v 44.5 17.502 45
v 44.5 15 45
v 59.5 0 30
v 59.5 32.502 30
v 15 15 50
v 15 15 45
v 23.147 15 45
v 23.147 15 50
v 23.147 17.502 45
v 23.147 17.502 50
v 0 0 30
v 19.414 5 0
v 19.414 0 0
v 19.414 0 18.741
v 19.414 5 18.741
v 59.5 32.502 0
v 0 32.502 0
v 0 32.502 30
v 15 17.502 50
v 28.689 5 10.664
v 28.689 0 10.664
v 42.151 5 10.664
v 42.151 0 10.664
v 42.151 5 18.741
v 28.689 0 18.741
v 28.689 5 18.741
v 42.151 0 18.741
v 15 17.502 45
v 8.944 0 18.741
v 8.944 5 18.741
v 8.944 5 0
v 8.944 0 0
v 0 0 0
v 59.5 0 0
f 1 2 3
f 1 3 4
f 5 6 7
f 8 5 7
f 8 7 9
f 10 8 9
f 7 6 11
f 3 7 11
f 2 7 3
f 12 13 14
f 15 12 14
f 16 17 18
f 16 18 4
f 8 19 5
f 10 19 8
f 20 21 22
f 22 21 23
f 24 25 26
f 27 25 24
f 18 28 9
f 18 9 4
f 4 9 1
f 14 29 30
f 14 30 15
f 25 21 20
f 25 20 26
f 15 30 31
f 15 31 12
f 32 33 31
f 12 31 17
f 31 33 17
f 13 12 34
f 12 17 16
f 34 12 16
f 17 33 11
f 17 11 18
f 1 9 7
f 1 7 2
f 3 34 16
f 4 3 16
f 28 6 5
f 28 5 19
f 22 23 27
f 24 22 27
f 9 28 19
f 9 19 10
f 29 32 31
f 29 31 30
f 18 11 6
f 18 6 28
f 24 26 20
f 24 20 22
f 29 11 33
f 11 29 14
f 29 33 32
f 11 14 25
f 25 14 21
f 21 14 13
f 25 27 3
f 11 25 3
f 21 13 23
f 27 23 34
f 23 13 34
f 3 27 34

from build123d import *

# Parameters (mm, degrees)
F0_W     = 59.5000050962
F0_H     = 32.5015373528
F1_DEPTH = 25
F2_W     = 59.5000050962
F2_H     = 32.5015373528
F3_DEPTH = 20
F4_SIZE  = 15
F5_W     = 10.4703865945
F5_H     = 18.7411587685
F5_W_2   = 13.4615413845
F5_H_2   = 8.076922968
F6_DEPTH = 5
F7_W     = 8.1467057019
F7_H     = 2.5015373528
F8_DEPTH = 5


with BuildPart() as f1:
    # F0 (on Top) → F1 (new body)
    with BuildSketch(Plane.XY):
        with Locations((29.7500025481, 16.2507686764)):
            Rectangle(F0_W, F0_H)
    extrude(amount=F1_DEPTH)

    # F2 (on face) → F3 (join)
    with BuildSketch(Plane.XY.offset(25)):
        with Locations((29.7500025481, 16.2507686764)):
            Rectangle(F2_W, F2_H)
    extrude(amount=F3_DEPTH)

    # F4
    f4_edges = [f1.edges().sort_by_distance(p)[0] for p in [
        (0, 16.250769, 45),
        (59.500005, 16.250769, 45),
        (29.750003, 0, 45),
        (29.750003, 32.501537, 45),
    ]]
    chamfer(f4_edges, length=F4_SIZE)

    # F5 (on face) → F6 (cut)
    with BuildSketch(Plane.XZ):
        with Locations((14.1790322959, 9.3705793843)):
            Rectangle(F5_W, F5_H)
        with Locations((35.4199837893, 14.7026972845)):
            Rectangle(F5_W_2, F5_H_2)
    extrude(amount=-F6_DEPTH, mode=Mode.SUBTRACT)

    # F7 (on face) → F8 (join)
    with BuildSketch(Plane.XY.offset(45)):
        with Locations((19.073352851, 16.2507686764)):
            Rectangle(F7_W, F7_H)
    extrude(amount=F8_DEPTH)


solid = f1.part
